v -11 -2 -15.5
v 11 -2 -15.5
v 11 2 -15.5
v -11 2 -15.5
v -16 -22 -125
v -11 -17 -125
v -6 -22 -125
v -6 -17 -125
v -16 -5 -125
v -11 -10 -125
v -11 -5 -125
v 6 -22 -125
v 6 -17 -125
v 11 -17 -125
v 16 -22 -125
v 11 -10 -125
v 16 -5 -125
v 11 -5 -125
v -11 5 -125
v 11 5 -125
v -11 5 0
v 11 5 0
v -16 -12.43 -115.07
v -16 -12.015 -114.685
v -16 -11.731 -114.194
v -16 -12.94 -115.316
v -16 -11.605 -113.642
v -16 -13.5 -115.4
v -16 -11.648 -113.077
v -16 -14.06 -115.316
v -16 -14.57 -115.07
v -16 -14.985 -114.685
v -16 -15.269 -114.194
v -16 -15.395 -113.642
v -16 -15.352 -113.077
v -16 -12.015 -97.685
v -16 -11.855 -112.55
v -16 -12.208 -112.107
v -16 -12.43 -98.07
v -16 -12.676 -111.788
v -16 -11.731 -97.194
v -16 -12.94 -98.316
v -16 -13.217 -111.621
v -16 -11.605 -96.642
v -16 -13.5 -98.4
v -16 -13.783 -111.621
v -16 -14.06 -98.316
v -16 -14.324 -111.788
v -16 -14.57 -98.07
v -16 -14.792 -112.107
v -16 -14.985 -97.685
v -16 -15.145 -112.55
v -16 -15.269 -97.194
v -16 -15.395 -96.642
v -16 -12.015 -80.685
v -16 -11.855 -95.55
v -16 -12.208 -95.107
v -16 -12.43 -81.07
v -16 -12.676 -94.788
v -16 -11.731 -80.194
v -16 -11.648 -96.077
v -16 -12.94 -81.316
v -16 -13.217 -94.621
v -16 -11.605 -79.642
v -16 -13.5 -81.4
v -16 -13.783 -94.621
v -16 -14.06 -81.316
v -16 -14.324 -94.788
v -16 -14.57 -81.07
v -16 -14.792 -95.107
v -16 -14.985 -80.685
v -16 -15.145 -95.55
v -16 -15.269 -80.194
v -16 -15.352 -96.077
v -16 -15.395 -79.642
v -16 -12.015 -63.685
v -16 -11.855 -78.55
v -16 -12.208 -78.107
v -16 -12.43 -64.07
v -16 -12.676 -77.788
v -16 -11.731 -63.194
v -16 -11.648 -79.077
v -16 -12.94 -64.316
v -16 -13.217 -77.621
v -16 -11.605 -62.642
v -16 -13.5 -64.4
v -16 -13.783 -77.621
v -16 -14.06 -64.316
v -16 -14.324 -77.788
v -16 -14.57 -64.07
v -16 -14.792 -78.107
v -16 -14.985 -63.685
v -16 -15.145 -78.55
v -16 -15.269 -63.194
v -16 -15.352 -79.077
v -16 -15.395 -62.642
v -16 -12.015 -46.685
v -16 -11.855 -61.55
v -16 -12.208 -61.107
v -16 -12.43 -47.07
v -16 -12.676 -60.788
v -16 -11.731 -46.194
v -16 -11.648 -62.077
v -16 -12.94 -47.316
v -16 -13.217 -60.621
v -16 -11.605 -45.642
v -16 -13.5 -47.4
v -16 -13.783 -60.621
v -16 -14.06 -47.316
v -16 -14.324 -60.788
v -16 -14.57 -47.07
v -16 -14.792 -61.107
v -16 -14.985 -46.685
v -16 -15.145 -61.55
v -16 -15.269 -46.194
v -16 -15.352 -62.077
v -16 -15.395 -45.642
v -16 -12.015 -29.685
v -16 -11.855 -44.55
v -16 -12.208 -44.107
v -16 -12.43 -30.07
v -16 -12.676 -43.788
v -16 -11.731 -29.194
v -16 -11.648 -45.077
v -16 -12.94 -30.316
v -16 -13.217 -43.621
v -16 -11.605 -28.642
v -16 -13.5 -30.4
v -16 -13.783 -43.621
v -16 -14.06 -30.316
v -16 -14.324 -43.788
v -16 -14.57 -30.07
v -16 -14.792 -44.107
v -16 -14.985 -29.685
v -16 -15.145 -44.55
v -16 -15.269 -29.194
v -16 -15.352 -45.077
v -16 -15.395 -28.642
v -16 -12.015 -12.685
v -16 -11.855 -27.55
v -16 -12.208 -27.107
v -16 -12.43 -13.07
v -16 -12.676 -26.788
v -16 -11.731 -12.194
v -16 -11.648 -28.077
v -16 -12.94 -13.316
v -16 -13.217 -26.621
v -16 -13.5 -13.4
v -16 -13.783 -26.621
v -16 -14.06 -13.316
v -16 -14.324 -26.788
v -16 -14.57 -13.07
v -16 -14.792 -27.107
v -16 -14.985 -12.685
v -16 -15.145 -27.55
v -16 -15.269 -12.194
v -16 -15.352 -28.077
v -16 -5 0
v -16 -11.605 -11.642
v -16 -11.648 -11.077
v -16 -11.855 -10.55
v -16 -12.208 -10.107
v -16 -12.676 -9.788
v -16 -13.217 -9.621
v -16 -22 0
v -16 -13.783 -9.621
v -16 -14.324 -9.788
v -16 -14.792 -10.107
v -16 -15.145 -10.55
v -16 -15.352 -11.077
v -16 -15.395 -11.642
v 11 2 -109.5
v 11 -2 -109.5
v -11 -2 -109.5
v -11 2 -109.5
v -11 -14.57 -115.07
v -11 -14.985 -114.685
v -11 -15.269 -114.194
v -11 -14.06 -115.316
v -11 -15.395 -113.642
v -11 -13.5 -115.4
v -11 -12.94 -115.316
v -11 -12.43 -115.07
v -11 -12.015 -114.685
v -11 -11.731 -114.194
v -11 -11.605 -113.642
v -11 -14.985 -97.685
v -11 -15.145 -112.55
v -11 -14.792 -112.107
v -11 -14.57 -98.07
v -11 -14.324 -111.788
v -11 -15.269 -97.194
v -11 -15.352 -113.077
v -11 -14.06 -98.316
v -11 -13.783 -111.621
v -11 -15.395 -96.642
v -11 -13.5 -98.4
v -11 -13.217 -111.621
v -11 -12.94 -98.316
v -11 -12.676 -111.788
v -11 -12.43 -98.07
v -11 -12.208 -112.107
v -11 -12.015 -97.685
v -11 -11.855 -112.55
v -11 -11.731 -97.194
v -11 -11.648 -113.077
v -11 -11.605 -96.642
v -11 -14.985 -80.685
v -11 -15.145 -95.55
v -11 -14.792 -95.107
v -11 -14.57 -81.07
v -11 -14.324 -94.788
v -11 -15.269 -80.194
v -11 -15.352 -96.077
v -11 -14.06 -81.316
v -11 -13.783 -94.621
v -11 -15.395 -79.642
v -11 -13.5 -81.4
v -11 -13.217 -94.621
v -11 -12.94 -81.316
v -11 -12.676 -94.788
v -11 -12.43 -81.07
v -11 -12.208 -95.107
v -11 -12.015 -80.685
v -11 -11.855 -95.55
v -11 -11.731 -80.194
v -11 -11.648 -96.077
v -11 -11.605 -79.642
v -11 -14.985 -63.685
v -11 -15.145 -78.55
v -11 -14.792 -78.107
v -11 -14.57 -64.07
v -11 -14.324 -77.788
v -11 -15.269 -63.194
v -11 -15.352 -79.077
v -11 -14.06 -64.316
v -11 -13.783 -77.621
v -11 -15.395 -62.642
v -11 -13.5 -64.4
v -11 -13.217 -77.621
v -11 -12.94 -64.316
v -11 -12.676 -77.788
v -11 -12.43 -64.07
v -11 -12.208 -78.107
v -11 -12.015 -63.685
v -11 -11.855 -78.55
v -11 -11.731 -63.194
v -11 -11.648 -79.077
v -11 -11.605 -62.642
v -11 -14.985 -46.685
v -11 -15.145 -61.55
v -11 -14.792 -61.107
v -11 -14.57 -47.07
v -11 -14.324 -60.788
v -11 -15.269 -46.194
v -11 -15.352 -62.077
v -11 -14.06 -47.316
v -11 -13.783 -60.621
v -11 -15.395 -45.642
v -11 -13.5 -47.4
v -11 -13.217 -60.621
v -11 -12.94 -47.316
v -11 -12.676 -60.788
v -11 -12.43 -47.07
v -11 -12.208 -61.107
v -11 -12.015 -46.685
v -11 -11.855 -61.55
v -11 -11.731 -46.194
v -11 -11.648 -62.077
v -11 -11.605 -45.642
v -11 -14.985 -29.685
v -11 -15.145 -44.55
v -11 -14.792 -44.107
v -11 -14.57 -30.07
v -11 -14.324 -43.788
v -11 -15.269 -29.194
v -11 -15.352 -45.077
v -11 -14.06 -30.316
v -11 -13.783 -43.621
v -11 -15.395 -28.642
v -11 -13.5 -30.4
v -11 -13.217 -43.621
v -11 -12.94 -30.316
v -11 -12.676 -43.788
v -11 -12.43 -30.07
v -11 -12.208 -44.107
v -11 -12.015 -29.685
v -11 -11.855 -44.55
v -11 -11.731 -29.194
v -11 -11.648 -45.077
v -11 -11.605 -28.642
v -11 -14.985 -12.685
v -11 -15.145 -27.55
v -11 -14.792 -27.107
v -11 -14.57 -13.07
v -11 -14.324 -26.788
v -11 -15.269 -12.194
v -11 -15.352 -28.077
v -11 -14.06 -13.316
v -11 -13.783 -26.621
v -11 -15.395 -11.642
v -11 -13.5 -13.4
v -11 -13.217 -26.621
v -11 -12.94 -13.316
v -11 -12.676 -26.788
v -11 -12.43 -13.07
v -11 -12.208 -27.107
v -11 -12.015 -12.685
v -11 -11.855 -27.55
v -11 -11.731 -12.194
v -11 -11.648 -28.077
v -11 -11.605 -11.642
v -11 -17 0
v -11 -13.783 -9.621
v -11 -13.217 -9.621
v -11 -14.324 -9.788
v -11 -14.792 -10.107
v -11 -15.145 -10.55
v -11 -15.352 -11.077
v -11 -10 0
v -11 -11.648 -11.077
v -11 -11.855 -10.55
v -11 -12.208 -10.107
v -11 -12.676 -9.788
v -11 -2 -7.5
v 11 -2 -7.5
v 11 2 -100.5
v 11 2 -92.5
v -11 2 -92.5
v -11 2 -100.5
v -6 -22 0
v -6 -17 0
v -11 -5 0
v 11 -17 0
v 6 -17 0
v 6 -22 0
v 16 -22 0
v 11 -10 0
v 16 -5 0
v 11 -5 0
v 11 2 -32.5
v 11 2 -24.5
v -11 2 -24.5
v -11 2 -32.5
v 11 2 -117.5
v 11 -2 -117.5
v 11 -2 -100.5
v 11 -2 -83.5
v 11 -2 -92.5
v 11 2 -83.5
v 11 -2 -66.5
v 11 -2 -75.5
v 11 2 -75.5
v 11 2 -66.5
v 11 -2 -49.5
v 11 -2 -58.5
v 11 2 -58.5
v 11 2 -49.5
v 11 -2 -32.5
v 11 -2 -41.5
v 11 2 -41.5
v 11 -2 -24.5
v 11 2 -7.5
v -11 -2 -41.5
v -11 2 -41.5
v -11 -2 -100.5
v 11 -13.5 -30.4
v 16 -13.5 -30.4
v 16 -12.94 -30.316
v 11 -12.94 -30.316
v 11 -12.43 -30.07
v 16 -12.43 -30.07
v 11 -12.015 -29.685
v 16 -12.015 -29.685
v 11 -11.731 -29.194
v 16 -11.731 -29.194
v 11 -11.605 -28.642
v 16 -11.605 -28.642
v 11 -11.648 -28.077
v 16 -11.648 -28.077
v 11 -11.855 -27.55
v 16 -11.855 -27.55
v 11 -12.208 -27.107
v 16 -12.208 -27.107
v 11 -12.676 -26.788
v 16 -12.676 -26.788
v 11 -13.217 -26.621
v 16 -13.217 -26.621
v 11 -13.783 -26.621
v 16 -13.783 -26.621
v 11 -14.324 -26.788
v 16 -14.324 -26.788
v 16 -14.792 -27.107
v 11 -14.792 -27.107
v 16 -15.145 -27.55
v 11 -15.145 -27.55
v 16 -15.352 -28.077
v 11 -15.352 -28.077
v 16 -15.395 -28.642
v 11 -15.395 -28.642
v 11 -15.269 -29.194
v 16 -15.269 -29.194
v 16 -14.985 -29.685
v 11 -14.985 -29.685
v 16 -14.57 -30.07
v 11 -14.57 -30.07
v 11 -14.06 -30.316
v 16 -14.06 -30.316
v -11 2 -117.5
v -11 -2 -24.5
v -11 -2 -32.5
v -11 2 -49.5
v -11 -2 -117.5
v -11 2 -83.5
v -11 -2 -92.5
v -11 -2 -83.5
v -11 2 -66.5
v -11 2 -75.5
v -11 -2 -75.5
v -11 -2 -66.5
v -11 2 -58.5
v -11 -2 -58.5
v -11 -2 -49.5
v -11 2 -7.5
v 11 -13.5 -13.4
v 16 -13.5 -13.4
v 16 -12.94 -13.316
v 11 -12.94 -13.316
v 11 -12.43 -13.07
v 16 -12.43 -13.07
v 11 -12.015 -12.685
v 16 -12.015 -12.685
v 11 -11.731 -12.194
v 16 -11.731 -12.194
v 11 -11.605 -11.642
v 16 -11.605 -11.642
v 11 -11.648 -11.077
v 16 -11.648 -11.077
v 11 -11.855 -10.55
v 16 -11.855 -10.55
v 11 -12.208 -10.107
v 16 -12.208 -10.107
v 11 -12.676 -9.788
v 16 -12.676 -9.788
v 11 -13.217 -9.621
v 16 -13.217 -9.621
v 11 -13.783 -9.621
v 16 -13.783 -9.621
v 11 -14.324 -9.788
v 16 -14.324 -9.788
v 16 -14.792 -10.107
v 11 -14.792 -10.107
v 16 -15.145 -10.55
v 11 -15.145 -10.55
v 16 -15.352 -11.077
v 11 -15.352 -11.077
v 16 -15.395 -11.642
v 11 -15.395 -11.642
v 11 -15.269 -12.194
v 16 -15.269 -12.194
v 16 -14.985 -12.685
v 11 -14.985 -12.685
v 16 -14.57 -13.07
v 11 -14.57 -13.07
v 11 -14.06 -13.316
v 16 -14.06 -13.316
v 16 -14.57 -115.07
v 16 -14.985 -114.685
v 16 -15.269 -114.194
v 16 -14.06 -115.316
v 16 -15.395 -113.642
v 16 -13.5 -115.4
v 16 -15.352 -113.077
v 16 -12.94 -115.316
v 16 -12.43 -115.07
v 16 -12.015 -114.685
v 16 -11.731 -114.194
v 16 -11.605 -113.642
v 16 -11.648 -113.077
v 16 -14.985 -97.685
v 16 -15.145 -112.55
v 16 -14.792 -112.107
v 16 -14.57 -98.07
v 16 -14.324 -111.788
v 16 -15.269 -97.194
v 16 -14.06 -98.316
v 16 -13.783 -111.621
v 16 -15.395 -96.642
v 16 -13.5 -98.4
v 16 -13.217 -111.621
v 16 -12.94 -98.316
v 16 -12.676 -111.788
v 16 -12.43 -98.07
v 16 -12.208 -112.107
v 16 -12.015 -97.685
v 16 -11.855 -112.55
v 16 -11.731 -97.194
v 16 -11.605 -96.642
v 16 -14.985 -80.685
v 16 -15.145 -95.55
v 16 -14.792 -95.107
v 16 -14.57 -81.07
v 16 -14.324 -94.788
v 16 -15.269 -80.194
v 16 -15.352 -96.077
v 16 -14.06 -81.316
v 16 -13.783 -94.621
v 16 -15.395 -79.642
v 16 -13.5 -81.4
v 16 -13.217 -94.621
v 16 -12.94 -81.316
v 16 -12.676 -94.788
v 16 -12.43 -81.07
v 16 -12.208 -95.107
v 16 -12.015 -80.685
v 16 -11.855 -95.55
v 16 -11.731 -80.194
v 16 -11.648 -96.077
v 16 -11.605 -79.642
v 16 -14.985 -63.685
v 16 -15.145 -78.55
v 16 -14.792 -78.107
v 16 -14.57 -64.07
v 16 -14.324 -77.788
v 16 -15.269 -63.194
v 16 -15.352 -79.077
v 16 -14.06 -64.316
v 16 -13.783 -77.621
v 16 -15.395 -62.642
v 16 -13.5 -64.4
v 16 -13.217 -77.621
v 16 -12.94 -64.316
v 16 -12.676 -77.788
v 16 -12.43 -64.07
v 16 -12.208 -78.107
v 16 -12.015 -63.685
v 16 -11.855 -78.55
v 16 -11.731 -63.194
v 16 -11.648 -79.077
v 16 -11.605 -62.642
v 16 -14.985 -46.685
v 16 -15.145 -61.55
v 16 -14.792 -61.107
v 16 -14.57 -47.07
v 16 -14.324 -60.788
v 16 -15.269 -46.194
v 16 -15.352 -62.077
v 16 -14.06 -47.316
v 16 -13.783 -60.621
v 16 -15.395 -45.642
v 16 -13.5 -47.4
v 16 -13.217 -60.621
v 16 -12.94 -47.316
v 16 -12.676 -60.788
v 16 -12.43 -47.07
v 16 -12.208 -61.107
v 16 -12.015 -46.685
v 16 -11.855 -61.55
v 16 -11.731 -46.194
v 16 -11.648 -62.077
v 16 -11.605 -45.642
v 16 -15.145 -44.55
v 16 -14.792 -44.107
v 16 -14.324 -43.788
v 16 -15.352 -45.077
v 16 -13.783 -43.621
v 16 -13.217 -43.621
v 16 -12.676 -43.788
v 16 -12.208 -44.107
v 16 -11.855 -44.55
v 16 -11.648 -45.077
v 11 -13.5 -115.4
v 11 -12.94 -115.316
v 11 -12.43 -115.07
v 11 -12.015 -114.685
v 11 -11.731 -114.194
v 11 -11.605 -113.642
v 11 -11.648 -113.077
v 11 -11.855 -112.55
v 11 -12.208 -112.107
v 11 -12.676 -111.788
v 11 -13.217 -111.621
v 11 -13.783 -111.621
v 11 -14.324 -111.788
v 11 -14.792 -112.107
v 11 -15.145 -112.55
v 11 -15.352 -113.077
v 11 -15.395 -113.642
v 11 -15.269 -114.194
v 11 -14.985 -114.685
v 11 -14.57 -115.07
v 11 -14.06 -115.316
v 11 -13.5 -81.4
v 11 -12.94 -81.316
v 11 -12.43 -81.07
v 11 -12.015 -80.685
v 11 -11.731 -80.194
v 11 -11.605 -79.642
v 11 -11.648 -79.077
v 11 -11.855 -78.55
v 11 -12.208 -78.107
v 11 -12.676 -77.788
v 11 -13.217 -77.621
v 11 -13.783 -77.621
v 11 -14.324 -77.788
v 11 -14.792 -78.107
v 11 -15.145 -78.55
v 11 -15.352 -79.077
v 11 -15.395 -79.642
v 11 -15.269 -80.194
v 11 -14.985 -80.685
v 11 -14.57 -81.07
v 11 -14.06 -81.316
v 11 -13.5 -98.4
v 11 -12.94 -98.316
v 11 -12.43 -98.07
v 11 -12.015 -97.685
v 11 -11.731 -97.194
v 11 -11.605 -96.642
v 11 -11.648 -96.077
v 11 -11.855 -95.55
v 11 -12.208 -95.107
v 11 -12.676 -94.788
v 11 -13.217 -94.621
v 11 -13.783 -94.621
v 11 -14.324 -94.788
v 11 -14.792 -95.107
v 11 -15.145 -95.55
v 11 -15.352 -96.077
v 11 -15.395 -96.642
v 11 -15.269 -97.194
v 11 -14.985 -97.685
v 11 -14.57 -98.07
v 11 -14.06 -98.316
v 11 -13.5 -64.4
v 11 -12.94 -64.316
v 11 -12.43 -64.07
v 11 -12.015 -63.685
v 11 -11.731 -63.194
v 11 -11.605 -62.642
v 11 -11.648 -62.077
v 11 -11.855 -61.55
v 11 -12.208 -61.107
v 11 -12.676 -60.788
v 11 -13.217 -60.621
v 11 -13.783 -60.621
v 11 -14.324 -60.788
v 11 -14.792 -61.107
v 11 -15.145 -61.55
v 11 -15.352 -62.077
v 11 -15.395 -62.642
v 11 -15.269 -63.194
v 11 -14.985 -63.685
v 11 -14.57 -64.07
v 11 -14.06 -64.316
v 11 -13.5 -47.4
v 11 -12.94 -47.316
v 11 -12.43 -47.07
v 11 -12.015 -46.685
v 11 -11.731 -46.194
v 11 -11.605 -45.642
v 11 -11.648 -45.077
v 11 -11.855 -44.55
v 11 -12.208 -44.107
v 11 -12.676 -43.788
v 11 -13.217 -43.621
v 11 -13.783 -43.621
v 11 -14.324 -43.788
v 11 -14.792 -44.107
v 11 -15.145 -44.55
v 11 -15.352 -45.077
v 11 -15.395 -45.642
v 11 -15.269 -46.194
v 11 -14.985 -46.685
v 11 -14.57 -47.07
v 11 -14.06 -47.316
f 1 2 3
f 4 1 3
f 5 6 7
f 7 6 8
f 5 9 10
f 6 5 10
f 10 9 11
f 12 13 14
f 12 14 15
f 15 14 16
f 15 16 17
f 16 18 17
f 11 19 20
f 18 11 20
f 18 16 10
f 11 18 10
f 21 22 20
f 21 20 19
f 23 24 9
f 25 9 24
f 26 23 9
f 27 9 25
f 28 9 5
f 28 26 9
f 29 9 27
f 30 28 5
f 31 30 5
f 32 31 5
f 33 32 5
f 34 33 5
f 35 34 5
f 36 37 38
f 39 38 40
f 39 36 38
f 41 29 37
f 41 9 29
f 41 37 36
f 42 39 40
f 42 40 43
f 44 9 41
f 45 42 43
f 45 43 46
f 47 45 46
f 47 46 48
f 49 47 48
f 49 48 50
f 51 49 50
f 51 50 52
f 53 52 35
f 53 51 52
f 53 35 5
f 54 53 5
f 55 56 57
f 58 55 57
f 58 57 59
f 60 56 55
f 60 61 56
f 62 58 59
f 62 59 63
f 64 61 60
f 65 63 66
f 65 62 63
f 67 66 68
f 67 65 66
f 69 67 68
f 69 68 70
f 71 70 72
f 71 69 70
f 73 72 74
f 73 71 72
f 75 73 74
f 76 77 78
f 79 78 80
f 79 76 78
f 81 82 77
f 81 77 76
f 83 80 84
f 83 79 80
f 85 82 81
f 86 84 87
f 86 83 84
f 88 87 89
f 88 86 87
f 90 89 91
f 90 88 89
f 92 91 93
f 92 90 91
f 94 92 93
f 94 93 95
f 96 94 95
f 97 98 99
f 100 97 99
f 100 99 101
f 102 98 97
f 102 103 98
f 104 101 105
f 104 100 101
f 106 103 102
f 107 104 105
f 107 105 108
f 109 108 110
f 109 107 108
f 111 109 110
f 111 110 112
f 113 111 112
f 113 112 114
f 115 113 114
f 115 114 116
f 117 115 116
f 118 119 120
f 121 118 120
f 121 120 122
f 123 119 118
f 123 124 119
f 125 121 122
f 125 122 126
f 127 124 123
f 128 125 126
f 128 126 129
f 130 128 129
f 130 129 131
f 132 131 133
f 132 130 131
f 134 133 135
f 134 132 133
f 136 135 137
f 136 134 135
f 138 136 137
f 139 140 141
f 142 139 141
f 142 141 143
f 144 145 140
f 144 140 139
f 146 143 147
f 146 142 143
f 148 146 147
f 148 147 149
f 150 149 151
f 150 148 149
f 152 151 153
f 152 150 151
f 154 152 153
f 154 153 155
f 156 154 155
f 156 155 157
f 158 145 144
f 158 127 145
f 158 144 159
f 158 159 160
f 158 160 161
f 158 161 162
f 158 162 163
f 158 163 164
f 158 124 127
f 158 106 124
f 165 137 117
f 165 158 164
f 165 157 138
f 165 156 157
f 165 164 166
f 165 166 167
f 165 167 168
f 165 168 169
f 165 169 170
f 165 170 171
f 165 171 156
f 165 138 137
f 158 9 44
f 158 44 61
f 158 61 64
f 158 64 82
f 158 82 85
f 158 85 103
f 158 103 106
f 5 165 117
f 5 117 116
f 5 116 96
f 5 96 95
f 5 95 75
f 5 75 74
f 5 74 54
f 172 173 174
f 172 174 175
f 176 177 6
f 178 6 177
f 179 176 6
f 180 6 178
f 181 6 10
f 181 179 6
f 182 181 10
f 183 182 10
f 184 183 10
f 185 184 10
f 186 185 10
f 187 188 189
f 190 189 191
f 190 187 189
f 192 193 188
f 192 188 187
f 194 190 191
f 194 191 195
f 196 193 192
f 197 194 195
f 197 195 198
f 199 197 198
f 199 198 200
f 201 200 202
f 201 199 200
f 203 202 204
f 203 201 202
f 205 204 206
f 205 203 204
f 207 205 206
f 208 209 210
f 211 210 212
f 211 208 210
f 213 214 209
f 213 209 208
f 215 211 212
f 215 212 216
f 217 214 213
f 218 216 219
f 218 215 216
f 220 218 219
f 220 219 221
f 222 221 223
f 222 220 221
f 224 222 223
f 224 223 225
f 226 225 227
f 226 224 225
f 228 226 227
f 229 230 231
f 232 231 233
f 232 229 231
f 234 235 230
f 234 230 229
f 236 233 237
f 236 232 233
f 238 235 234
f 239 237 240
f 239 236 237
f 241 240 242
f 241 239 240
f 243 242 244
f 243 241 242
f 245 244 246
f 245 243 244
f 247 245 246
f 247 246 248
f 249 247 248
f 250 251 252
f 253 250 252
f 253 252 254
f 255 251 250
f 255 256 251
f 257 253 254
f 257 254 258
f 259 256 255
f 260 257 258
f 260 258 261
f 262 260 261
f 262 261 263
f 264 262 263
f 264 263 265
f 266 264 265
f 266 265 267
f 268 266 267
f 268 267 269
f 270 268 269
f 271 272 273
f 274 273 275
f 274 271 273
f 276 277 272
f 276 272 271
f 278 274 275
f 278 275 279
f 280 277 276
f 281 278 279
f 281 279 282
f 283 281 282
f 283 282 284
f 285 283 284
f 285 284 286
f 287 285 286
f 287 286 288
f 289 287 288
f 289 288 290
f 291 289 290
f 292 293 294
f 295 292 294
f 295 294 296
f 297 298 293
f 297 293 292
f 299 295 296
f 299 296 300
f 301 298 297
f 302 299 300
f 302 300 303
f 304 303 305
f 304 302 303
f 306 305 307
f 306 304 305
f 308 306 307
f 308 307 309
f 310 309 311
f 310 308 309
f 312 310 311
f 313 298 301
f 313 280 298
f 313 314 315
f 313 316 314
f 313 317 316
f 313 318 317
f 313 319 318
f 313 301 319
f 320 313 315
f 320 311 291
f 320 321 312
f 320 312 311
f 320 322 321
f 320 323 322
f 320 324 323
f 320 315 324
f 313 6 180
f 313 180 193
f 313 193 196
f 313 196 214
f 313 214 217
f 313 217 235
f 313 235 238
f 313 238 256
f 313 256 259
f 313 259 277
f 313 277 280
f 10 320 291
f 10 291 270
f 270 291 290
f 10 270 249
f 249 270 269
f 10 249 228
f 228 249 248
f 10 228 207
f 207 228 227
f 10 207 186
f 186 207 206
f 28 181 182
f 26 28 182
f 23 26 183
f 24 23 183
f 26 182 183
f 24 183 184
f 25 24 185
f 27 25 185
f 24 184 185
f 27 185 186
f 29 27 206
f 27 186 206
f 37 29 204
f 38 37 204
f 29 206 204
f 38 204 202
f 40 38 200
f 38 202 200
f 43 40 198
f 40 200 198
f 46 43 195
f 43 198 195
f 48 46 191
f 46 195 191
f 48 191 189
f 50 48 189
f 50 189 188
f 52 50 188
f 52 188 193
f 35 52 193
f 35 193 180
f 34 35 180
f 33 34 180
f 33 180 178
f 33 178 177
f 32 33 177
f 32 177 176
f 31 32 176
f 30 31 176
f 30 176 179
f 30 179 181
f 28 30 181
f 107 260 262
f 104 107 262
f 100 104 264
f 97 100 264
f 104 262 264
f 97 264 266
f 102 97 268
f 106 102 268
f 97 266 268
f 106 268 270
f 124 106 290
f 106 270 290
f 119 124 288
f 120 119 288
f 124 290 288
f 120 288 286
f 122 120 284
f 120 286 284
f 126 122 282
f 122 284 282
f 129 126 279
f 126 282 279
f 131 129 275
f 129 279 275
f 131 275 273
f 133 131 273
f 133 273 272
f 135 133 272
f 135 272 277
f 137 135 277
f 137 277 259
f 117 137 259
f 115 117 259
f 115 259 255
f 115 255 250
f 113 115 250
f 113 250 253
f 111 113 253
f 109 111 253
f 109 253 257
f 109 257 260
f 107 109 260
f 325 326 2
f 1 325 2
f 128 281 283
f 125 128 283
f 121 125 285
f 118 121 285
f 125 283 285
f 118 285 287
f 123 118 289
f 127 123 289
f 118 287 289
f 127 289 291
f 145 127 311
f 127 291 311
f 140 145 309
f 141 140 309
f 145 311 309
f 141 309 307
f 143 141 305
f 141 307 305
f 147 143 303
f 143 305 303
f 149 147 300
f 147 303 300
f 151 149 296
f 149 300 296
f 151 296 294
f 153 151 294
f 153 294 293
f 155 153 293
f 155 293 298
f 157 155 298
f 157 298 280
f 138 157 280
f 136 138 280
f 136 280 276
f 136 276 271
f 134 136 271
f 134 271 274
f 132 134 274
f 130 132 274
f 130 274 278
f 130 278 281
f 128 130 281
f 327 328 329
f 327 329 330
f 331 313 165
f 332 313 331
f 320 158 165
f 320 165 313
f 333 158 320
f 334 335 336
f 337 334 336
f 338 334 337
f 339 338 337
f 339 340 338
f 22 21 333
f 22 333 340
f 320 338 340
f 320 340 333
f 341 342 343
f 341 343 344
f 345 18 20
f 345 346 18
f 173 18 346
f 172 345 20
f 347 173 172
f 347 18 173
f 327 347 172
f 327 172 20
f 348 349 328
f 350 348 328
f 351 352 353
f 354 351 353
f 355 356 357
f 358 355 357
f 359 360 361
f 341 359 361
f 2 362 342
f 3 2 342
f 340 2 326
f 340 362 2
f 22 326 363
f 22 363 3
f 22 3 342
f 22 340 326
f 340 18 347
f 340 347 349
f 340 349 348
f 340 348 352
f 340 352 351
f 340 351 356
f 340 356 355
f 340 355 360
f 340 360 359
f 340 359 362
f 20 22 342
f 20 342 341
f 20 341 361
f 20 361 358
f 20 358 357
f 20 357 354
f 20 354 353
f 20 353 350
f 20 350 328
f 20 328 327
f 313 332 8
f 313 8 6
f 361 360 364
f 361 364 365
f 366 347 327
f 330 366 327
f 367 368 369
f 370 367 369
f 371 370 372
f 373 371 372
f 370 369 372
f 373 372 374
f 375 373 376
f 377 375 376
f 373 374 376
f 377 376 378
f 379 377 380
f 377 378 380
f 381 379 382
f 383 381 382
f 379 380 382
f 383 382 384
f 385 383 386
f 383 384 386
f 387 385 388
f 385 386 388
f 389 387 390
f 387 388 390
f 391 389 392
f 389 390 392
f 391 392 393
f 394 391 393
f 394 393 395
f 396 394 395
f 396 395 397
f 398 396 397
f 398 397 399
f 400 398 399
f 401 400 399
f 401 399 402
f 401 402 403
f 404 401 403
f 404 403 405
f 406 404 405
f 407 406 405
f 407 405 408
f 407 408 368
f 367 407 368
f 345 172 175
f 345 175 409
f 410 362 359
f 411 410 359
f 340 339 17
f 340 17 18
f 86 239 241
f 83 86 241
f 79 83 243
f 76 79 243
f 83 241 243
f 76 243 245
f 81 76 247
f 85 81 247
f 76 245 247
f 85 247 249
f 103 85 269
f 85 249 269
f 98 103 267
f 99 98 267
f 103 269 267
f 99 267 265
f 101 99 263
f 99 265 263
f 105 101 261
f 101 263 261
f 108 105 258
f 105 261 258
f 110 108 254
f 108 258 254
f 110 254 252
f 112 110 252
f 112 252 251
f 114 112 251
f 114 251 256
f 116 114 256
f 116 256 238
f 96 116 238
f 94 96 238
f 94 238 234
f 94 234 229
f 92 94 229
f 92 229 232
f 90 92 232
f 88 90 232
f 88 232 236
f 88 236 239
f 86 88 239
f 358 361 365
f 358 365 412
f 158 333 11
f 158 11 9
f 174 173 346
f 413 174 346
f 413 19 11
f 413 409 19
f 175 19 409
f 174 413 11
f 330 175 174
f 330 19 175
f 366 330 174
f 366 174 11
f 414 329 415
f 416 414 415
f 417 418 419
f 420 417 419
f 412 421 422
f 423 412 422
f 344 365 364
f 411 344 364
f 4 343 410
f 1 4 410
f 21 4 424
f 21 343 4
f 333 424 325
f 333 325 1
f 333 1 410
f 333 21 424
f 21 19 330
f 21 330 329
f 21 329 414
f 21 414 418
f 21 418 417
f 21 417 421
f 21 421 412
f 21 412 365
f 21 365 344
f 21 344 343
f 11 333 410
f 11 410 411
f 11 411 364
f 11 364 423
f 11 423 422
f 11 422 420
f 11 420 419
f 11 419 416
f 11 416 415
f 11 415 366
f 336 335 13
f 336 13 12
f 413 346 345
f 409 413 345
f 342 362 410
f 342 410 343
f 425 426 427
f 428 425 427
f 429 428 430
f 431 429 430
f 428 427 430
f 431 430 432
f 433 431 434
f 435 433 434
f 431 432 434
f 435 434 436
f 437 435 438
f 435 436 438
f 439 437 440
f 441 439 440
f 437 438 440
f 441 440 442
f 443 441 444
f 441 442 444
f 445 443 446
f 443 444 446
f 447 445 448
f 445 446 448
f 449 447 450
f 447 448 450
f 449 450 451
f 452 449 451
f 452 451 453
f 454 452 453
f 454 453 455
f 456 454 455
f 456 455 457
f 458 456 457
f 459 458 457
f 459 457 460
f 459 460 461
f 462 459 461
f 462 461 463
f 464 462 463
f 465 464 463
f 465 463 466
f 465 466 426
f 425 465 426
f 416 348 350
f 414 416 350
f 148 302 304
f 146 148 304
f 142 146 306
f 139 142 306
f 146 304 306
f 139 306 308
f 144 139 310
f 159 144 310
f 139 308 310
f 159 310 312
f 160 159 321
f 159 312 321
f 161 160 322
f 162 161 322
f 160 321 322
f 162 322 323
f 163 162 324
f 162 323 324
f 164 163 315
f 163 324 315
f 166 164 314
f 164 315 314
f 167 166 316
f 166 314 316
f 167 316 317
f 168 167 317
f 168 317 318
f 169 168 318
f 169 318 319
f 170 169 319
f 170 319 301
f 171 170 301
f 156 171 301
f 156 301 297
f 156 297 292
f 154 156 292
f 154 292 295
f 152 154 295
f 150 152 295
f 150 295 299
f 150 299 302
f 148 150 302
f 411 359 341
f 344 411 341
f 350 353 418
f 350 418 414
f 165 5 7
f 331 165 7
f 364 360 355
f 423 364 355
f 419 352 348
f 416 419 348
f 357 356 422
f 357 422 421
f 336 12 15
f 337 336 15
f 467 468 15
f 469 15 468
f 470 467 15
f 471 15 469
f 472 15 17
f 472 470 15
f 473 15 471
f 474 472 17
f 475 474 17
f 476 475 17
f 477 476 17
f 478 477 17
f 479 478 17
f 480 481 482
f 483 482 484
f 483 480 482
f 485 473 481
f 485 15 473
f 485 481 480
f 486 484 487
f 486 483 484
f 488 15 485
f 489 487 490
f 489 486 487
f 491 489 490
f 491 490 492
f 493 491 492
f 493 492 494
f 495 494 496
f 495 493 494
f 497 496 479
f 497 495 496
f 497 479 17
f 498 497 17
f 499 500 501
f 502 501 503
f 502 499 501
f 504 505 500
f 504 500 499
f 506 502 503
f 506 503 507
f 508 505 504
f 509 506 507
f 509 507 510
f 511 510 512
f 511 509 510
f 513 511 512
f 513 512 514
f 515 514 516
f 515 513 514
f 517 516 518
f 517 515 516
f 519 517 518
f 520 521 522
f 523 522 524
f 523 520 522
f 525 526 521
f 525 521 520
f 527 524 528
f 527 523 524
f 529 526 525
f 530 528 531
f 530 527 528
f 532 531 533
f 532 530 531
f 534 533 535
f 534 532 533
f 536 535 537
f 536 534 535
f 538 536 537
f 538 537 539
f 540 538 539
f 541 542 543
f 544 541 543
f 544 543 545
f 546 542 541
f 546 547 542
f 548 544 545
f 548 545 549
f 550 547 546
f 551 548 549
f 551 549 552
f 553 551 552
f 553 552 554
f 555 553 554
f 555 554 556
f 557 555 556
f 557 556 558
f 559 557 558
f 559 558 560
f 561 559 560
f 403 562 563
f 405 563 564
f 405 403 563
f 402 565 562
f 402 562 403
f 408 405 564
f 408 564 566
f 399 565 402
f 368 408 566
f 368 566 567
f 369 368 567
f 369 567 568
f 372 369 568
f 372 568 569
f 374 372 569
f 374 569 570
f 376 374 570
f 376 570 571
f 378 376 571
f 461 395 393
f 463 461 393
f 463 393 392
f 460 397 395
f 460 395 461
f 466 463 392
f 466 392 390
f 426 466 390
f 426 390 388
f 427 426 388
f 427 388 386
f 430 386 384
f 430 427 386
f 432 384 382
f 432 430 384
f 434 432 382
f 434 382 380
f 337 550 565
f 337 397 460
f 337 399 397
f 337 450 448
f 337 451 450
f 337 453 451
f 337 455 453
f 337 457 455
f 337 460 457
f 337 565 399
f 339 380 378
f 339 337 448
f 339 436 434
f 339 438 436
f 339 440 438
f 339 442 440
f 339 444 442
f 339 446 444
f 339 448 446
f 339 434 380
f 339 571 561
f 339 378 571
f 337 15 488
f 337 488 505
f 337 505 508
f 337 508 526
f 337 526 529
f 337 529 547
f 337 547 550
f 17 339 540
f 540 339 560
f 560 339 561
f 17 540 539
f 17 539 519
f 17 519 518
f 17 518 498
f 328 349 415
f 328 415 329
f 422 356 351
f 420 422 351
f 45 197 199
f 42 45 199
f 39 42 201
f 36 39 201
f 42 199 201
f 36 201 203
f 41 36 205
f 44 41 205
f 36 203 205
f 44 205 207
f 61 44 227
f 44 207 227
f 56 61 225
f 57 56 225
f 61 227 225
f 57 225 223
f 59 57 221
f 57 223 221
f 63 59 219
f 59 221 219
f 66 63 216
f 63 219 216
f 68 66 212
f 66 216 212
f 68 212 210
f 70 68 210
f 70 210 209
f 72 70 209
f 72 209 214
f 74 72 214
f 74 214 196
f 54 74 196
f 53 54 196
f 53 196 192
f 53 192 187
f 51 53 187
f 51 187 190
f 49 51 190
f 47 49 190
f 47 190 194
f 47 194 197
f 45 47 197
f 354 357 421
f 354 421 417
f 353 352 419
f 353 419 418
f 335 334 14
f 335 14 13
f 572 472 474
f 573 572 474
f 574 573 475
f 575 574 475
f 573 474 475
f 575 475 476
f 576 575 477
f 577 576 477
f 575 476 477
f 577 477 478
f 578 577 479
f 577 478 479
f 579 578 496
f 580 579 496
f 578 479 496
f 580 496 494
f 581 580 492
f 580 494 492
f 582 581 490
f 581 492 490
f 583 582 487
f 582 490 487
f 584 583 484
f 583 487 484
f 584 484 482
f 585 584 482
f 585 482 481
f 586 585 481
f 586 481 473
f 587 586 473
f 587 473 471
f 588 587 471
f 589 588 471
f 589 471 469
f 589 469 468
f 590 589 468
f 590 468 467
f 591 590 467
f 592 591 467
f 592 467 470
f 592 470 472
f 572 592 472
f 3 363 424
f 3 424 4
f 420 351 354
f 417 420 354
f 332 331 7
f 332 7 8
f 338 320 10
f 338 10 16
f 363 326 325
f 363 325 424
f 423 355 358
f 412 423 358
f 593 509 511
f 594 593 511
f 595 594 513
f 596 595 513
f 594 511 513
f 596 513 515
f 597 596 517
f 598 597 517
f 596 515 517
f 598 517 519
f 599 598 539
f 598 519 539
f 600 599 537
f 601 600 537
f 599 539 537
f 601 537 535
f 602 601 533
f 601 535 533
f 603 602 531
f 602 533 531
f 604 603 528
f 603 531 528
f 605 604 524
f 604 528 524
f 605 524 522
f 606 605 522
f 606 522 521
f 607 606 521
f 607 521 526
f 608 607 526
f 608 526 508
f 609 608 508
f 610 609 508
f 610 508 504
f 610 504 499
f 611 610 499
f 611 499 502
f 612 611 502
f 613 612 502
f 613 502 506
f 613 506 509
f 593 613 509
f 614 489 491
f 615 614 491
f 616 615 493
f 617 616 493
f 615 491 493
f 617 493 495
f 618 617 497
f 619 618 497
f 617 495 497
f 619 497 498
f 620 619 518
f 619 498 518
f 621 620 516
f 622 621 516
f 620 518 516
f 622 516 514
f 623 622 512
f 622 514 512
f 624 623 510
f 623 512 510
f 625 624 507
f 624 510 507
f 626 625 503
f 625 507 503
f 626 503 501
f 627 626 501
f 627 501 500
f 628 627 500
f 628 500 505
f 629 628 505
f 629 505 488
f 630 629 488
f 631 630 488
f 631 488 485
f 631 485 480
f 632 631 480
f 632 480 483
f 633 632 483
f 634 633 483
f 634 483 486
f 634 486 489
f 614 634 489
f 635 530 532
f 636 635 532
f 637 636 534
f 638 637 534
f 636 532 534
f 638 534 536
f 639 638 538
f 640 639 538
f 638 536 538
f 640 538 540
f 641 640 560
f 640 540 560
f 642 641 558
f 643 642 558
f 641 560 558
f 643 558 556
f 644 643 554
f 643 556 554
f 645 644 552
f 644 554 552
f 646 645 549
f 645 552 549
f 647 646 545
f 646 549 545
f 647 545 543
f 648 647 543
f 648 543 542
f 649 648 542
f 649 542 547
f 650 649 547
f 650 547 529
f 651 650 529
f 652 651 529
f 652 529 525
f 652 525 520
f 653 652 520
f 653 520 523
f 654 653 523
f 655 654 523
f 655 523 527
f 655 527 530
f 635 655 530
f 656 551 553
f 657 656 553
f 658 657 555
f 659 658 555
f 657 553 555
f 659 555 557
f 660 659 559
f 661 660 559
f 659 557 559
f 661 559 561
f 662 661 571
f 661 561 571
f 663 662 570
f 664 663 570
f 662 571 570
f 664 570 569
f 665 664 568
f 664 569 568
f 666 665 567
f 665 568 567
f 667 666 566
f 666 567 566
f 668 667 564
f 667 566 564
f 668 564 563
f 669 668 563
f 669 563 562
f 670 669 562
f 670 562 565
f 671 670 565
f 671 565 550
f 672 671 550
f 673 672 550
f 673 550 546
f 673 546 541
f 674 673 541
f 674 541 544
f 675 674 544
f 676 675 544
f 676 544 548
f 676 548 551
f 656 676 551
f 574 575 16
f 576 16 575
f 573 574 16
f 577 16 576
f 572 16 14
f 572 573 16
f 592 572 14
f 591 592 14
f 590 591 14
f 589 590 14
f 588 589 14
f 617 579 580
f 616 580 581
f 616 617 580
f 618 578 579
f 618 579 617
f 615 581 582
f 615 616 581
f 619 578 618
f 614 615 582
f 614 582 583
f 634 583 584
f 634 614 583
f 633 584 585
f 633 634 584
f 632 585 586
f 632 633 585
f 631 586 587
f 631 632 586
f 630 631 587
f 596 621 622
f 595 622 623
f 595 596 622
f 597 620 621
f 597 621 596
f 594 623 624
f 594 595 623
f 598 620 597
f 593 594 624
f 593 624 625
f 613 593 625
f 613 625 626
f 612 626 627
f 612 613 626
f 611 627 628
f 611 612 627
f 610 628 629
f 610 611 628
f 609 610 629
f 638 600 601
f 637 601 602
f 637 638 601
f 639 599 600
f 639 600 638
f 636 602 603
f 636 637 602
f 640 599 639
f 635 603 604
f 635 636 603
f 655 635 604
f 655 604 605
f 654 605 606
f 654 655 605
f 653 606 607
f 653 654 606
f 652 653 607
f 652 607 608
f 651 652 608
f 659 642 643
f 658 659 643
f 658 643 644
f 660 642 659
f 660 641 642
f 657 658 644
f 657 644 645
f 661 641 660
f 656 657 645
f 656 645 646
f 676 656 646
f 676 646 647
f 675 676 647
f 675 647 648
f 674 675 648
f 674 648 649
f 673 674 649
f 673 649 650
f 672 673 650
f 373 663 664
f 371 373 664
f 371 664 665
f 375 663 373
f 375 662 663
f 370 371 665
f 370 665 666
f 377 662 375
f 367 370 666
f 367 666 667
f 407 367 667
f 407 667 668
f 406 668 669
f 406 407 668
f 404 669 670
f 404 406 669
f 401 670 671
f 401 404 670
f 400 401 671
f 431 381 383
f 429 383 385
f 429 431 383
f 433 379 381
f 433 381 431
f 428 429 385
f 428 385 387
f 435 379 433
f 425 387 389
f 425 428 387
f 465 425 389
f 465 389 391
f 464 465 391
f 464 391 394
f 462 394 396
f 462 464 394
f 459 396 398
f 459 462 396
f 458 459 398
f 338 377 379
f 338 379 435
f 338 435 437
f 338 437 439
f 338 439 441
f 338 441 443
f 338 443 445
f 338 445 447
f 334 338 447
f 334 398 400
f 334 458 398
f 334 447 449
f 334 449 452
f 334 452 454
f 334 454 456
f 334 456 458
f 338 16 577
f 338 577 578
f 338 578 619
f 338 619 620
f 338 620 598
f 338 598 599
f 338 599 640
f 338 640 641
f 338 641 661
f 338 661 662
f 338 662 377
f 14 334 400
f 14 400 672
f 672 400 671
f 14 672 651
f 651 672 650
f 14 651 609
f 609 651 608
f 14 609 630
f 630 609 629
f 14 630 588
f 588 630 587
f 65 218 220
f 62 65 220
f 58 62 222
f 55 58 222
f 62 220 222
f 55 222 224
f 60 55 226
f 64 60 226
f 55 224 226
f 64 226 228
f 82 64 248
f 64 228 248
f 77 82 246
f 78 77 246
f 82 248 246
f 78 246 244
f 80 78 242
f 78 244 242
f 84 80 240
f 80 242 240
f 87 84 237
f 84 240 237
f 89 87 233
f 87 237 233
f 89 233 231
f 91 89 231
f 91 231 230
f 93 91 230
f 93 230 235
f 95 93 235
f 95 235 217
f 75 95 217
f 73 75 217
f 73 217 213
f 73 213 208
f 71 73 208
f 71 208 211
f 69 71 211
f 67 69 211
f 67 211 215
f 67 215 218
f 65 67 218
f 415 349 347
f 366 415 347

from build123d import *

# Parameters (mm, degrees)
BOSS_EXTRUDE1_DEPTH = 125
SKETCH2_R           = 1.9
CUT_EXTRUDE1_DEPTH  = 131.893086143
SKETCH3_W           = 8
SKETCH3_H           = 4
CUT_EXTRUDE2_DEPTH  = 130.761319352


with BuildPart() as part:
    # Sketch1 → Boss-Extrude1 (new body)
    with BuildSketch(Plane.XY):
        Polygon((11, 5), (-11, 5), (-11, -5), (-16, -5), (-16, -22), (-6, -22), (-6, -17), (-11, -17), (-11, -10), (11, -10), (11, -17), (6, -17), (6, -22), (16, -22), (16, -5), (11, -5), align=None)
    extrude(amount=-BOSS_EXTRUDE1_DEPTH)

    # Sketch2 → Cut-Extrude1 (cut, through all)
    with BuildSketch(Plane(origin=(16, 0, 0), x_dir=(0, 0, -1), z_dir=(1, 0, 0))):
        with Locations((62.5, -13.5)):
            Circle(SKETCH2_R)
        with Locations((79.5, -13.5)):
            Circle(SKETCH2_R)
        with Locations((96.5, -13.5)):
            Circle(SKETCH2_R)
        with Locations((45.5, -13.5)):
            Circle(SKETCH2_R)
        with Locations((28.5, -13.5)):
            Circle(SKETCH2_R)
        with Locations((113.5, -13.5)):
            Circle(SKETCH2_R)
        with Locations((11.5, -13.5)):
            Circle(SKETCH2_R)
    extrude(amount=-CUT_EXTRUDE1_DEPTH, mode=Mode.SUBTRACT)

    # Sketch3 → Cut-Extrude2 (cut, through all)
    with BuildSketch(Plane(origin=(11, 0, 0), x_dir=(0, 0, -1), z_dir=(1, 0, 0))):
        with Locations((79.5, 0)):
            Rectangle(SKETCH3_W, SKETCH3_H)
        with Locations((62.5, 0)):
            Rectangle(SKETCH3_W, SKETCH3_H)
        with Locations((96.5, 0)):
            Rectangle(SKETCH3_W, SKETCH3_H)
        with Locations((45.5, 0)):
            Rectangle(SKETCH3_W, SKETCH3_H)
        with Locations((28.5, 0)):
            Rectangle(SKETCH3_W, SKETCH3_H)
        with Locations((113.5, 0)):
            Rectangle(SKETCH3_W, SKETCH3_H)
        with Locations((11.5, 0)):
            Rectangle(SKETCH3_W, SKETCH3_H)
    extrude(amount=-CUT_EXTRUDE2_DEPTH, mode=Mode.SUBTRACT)


solid = part.part
